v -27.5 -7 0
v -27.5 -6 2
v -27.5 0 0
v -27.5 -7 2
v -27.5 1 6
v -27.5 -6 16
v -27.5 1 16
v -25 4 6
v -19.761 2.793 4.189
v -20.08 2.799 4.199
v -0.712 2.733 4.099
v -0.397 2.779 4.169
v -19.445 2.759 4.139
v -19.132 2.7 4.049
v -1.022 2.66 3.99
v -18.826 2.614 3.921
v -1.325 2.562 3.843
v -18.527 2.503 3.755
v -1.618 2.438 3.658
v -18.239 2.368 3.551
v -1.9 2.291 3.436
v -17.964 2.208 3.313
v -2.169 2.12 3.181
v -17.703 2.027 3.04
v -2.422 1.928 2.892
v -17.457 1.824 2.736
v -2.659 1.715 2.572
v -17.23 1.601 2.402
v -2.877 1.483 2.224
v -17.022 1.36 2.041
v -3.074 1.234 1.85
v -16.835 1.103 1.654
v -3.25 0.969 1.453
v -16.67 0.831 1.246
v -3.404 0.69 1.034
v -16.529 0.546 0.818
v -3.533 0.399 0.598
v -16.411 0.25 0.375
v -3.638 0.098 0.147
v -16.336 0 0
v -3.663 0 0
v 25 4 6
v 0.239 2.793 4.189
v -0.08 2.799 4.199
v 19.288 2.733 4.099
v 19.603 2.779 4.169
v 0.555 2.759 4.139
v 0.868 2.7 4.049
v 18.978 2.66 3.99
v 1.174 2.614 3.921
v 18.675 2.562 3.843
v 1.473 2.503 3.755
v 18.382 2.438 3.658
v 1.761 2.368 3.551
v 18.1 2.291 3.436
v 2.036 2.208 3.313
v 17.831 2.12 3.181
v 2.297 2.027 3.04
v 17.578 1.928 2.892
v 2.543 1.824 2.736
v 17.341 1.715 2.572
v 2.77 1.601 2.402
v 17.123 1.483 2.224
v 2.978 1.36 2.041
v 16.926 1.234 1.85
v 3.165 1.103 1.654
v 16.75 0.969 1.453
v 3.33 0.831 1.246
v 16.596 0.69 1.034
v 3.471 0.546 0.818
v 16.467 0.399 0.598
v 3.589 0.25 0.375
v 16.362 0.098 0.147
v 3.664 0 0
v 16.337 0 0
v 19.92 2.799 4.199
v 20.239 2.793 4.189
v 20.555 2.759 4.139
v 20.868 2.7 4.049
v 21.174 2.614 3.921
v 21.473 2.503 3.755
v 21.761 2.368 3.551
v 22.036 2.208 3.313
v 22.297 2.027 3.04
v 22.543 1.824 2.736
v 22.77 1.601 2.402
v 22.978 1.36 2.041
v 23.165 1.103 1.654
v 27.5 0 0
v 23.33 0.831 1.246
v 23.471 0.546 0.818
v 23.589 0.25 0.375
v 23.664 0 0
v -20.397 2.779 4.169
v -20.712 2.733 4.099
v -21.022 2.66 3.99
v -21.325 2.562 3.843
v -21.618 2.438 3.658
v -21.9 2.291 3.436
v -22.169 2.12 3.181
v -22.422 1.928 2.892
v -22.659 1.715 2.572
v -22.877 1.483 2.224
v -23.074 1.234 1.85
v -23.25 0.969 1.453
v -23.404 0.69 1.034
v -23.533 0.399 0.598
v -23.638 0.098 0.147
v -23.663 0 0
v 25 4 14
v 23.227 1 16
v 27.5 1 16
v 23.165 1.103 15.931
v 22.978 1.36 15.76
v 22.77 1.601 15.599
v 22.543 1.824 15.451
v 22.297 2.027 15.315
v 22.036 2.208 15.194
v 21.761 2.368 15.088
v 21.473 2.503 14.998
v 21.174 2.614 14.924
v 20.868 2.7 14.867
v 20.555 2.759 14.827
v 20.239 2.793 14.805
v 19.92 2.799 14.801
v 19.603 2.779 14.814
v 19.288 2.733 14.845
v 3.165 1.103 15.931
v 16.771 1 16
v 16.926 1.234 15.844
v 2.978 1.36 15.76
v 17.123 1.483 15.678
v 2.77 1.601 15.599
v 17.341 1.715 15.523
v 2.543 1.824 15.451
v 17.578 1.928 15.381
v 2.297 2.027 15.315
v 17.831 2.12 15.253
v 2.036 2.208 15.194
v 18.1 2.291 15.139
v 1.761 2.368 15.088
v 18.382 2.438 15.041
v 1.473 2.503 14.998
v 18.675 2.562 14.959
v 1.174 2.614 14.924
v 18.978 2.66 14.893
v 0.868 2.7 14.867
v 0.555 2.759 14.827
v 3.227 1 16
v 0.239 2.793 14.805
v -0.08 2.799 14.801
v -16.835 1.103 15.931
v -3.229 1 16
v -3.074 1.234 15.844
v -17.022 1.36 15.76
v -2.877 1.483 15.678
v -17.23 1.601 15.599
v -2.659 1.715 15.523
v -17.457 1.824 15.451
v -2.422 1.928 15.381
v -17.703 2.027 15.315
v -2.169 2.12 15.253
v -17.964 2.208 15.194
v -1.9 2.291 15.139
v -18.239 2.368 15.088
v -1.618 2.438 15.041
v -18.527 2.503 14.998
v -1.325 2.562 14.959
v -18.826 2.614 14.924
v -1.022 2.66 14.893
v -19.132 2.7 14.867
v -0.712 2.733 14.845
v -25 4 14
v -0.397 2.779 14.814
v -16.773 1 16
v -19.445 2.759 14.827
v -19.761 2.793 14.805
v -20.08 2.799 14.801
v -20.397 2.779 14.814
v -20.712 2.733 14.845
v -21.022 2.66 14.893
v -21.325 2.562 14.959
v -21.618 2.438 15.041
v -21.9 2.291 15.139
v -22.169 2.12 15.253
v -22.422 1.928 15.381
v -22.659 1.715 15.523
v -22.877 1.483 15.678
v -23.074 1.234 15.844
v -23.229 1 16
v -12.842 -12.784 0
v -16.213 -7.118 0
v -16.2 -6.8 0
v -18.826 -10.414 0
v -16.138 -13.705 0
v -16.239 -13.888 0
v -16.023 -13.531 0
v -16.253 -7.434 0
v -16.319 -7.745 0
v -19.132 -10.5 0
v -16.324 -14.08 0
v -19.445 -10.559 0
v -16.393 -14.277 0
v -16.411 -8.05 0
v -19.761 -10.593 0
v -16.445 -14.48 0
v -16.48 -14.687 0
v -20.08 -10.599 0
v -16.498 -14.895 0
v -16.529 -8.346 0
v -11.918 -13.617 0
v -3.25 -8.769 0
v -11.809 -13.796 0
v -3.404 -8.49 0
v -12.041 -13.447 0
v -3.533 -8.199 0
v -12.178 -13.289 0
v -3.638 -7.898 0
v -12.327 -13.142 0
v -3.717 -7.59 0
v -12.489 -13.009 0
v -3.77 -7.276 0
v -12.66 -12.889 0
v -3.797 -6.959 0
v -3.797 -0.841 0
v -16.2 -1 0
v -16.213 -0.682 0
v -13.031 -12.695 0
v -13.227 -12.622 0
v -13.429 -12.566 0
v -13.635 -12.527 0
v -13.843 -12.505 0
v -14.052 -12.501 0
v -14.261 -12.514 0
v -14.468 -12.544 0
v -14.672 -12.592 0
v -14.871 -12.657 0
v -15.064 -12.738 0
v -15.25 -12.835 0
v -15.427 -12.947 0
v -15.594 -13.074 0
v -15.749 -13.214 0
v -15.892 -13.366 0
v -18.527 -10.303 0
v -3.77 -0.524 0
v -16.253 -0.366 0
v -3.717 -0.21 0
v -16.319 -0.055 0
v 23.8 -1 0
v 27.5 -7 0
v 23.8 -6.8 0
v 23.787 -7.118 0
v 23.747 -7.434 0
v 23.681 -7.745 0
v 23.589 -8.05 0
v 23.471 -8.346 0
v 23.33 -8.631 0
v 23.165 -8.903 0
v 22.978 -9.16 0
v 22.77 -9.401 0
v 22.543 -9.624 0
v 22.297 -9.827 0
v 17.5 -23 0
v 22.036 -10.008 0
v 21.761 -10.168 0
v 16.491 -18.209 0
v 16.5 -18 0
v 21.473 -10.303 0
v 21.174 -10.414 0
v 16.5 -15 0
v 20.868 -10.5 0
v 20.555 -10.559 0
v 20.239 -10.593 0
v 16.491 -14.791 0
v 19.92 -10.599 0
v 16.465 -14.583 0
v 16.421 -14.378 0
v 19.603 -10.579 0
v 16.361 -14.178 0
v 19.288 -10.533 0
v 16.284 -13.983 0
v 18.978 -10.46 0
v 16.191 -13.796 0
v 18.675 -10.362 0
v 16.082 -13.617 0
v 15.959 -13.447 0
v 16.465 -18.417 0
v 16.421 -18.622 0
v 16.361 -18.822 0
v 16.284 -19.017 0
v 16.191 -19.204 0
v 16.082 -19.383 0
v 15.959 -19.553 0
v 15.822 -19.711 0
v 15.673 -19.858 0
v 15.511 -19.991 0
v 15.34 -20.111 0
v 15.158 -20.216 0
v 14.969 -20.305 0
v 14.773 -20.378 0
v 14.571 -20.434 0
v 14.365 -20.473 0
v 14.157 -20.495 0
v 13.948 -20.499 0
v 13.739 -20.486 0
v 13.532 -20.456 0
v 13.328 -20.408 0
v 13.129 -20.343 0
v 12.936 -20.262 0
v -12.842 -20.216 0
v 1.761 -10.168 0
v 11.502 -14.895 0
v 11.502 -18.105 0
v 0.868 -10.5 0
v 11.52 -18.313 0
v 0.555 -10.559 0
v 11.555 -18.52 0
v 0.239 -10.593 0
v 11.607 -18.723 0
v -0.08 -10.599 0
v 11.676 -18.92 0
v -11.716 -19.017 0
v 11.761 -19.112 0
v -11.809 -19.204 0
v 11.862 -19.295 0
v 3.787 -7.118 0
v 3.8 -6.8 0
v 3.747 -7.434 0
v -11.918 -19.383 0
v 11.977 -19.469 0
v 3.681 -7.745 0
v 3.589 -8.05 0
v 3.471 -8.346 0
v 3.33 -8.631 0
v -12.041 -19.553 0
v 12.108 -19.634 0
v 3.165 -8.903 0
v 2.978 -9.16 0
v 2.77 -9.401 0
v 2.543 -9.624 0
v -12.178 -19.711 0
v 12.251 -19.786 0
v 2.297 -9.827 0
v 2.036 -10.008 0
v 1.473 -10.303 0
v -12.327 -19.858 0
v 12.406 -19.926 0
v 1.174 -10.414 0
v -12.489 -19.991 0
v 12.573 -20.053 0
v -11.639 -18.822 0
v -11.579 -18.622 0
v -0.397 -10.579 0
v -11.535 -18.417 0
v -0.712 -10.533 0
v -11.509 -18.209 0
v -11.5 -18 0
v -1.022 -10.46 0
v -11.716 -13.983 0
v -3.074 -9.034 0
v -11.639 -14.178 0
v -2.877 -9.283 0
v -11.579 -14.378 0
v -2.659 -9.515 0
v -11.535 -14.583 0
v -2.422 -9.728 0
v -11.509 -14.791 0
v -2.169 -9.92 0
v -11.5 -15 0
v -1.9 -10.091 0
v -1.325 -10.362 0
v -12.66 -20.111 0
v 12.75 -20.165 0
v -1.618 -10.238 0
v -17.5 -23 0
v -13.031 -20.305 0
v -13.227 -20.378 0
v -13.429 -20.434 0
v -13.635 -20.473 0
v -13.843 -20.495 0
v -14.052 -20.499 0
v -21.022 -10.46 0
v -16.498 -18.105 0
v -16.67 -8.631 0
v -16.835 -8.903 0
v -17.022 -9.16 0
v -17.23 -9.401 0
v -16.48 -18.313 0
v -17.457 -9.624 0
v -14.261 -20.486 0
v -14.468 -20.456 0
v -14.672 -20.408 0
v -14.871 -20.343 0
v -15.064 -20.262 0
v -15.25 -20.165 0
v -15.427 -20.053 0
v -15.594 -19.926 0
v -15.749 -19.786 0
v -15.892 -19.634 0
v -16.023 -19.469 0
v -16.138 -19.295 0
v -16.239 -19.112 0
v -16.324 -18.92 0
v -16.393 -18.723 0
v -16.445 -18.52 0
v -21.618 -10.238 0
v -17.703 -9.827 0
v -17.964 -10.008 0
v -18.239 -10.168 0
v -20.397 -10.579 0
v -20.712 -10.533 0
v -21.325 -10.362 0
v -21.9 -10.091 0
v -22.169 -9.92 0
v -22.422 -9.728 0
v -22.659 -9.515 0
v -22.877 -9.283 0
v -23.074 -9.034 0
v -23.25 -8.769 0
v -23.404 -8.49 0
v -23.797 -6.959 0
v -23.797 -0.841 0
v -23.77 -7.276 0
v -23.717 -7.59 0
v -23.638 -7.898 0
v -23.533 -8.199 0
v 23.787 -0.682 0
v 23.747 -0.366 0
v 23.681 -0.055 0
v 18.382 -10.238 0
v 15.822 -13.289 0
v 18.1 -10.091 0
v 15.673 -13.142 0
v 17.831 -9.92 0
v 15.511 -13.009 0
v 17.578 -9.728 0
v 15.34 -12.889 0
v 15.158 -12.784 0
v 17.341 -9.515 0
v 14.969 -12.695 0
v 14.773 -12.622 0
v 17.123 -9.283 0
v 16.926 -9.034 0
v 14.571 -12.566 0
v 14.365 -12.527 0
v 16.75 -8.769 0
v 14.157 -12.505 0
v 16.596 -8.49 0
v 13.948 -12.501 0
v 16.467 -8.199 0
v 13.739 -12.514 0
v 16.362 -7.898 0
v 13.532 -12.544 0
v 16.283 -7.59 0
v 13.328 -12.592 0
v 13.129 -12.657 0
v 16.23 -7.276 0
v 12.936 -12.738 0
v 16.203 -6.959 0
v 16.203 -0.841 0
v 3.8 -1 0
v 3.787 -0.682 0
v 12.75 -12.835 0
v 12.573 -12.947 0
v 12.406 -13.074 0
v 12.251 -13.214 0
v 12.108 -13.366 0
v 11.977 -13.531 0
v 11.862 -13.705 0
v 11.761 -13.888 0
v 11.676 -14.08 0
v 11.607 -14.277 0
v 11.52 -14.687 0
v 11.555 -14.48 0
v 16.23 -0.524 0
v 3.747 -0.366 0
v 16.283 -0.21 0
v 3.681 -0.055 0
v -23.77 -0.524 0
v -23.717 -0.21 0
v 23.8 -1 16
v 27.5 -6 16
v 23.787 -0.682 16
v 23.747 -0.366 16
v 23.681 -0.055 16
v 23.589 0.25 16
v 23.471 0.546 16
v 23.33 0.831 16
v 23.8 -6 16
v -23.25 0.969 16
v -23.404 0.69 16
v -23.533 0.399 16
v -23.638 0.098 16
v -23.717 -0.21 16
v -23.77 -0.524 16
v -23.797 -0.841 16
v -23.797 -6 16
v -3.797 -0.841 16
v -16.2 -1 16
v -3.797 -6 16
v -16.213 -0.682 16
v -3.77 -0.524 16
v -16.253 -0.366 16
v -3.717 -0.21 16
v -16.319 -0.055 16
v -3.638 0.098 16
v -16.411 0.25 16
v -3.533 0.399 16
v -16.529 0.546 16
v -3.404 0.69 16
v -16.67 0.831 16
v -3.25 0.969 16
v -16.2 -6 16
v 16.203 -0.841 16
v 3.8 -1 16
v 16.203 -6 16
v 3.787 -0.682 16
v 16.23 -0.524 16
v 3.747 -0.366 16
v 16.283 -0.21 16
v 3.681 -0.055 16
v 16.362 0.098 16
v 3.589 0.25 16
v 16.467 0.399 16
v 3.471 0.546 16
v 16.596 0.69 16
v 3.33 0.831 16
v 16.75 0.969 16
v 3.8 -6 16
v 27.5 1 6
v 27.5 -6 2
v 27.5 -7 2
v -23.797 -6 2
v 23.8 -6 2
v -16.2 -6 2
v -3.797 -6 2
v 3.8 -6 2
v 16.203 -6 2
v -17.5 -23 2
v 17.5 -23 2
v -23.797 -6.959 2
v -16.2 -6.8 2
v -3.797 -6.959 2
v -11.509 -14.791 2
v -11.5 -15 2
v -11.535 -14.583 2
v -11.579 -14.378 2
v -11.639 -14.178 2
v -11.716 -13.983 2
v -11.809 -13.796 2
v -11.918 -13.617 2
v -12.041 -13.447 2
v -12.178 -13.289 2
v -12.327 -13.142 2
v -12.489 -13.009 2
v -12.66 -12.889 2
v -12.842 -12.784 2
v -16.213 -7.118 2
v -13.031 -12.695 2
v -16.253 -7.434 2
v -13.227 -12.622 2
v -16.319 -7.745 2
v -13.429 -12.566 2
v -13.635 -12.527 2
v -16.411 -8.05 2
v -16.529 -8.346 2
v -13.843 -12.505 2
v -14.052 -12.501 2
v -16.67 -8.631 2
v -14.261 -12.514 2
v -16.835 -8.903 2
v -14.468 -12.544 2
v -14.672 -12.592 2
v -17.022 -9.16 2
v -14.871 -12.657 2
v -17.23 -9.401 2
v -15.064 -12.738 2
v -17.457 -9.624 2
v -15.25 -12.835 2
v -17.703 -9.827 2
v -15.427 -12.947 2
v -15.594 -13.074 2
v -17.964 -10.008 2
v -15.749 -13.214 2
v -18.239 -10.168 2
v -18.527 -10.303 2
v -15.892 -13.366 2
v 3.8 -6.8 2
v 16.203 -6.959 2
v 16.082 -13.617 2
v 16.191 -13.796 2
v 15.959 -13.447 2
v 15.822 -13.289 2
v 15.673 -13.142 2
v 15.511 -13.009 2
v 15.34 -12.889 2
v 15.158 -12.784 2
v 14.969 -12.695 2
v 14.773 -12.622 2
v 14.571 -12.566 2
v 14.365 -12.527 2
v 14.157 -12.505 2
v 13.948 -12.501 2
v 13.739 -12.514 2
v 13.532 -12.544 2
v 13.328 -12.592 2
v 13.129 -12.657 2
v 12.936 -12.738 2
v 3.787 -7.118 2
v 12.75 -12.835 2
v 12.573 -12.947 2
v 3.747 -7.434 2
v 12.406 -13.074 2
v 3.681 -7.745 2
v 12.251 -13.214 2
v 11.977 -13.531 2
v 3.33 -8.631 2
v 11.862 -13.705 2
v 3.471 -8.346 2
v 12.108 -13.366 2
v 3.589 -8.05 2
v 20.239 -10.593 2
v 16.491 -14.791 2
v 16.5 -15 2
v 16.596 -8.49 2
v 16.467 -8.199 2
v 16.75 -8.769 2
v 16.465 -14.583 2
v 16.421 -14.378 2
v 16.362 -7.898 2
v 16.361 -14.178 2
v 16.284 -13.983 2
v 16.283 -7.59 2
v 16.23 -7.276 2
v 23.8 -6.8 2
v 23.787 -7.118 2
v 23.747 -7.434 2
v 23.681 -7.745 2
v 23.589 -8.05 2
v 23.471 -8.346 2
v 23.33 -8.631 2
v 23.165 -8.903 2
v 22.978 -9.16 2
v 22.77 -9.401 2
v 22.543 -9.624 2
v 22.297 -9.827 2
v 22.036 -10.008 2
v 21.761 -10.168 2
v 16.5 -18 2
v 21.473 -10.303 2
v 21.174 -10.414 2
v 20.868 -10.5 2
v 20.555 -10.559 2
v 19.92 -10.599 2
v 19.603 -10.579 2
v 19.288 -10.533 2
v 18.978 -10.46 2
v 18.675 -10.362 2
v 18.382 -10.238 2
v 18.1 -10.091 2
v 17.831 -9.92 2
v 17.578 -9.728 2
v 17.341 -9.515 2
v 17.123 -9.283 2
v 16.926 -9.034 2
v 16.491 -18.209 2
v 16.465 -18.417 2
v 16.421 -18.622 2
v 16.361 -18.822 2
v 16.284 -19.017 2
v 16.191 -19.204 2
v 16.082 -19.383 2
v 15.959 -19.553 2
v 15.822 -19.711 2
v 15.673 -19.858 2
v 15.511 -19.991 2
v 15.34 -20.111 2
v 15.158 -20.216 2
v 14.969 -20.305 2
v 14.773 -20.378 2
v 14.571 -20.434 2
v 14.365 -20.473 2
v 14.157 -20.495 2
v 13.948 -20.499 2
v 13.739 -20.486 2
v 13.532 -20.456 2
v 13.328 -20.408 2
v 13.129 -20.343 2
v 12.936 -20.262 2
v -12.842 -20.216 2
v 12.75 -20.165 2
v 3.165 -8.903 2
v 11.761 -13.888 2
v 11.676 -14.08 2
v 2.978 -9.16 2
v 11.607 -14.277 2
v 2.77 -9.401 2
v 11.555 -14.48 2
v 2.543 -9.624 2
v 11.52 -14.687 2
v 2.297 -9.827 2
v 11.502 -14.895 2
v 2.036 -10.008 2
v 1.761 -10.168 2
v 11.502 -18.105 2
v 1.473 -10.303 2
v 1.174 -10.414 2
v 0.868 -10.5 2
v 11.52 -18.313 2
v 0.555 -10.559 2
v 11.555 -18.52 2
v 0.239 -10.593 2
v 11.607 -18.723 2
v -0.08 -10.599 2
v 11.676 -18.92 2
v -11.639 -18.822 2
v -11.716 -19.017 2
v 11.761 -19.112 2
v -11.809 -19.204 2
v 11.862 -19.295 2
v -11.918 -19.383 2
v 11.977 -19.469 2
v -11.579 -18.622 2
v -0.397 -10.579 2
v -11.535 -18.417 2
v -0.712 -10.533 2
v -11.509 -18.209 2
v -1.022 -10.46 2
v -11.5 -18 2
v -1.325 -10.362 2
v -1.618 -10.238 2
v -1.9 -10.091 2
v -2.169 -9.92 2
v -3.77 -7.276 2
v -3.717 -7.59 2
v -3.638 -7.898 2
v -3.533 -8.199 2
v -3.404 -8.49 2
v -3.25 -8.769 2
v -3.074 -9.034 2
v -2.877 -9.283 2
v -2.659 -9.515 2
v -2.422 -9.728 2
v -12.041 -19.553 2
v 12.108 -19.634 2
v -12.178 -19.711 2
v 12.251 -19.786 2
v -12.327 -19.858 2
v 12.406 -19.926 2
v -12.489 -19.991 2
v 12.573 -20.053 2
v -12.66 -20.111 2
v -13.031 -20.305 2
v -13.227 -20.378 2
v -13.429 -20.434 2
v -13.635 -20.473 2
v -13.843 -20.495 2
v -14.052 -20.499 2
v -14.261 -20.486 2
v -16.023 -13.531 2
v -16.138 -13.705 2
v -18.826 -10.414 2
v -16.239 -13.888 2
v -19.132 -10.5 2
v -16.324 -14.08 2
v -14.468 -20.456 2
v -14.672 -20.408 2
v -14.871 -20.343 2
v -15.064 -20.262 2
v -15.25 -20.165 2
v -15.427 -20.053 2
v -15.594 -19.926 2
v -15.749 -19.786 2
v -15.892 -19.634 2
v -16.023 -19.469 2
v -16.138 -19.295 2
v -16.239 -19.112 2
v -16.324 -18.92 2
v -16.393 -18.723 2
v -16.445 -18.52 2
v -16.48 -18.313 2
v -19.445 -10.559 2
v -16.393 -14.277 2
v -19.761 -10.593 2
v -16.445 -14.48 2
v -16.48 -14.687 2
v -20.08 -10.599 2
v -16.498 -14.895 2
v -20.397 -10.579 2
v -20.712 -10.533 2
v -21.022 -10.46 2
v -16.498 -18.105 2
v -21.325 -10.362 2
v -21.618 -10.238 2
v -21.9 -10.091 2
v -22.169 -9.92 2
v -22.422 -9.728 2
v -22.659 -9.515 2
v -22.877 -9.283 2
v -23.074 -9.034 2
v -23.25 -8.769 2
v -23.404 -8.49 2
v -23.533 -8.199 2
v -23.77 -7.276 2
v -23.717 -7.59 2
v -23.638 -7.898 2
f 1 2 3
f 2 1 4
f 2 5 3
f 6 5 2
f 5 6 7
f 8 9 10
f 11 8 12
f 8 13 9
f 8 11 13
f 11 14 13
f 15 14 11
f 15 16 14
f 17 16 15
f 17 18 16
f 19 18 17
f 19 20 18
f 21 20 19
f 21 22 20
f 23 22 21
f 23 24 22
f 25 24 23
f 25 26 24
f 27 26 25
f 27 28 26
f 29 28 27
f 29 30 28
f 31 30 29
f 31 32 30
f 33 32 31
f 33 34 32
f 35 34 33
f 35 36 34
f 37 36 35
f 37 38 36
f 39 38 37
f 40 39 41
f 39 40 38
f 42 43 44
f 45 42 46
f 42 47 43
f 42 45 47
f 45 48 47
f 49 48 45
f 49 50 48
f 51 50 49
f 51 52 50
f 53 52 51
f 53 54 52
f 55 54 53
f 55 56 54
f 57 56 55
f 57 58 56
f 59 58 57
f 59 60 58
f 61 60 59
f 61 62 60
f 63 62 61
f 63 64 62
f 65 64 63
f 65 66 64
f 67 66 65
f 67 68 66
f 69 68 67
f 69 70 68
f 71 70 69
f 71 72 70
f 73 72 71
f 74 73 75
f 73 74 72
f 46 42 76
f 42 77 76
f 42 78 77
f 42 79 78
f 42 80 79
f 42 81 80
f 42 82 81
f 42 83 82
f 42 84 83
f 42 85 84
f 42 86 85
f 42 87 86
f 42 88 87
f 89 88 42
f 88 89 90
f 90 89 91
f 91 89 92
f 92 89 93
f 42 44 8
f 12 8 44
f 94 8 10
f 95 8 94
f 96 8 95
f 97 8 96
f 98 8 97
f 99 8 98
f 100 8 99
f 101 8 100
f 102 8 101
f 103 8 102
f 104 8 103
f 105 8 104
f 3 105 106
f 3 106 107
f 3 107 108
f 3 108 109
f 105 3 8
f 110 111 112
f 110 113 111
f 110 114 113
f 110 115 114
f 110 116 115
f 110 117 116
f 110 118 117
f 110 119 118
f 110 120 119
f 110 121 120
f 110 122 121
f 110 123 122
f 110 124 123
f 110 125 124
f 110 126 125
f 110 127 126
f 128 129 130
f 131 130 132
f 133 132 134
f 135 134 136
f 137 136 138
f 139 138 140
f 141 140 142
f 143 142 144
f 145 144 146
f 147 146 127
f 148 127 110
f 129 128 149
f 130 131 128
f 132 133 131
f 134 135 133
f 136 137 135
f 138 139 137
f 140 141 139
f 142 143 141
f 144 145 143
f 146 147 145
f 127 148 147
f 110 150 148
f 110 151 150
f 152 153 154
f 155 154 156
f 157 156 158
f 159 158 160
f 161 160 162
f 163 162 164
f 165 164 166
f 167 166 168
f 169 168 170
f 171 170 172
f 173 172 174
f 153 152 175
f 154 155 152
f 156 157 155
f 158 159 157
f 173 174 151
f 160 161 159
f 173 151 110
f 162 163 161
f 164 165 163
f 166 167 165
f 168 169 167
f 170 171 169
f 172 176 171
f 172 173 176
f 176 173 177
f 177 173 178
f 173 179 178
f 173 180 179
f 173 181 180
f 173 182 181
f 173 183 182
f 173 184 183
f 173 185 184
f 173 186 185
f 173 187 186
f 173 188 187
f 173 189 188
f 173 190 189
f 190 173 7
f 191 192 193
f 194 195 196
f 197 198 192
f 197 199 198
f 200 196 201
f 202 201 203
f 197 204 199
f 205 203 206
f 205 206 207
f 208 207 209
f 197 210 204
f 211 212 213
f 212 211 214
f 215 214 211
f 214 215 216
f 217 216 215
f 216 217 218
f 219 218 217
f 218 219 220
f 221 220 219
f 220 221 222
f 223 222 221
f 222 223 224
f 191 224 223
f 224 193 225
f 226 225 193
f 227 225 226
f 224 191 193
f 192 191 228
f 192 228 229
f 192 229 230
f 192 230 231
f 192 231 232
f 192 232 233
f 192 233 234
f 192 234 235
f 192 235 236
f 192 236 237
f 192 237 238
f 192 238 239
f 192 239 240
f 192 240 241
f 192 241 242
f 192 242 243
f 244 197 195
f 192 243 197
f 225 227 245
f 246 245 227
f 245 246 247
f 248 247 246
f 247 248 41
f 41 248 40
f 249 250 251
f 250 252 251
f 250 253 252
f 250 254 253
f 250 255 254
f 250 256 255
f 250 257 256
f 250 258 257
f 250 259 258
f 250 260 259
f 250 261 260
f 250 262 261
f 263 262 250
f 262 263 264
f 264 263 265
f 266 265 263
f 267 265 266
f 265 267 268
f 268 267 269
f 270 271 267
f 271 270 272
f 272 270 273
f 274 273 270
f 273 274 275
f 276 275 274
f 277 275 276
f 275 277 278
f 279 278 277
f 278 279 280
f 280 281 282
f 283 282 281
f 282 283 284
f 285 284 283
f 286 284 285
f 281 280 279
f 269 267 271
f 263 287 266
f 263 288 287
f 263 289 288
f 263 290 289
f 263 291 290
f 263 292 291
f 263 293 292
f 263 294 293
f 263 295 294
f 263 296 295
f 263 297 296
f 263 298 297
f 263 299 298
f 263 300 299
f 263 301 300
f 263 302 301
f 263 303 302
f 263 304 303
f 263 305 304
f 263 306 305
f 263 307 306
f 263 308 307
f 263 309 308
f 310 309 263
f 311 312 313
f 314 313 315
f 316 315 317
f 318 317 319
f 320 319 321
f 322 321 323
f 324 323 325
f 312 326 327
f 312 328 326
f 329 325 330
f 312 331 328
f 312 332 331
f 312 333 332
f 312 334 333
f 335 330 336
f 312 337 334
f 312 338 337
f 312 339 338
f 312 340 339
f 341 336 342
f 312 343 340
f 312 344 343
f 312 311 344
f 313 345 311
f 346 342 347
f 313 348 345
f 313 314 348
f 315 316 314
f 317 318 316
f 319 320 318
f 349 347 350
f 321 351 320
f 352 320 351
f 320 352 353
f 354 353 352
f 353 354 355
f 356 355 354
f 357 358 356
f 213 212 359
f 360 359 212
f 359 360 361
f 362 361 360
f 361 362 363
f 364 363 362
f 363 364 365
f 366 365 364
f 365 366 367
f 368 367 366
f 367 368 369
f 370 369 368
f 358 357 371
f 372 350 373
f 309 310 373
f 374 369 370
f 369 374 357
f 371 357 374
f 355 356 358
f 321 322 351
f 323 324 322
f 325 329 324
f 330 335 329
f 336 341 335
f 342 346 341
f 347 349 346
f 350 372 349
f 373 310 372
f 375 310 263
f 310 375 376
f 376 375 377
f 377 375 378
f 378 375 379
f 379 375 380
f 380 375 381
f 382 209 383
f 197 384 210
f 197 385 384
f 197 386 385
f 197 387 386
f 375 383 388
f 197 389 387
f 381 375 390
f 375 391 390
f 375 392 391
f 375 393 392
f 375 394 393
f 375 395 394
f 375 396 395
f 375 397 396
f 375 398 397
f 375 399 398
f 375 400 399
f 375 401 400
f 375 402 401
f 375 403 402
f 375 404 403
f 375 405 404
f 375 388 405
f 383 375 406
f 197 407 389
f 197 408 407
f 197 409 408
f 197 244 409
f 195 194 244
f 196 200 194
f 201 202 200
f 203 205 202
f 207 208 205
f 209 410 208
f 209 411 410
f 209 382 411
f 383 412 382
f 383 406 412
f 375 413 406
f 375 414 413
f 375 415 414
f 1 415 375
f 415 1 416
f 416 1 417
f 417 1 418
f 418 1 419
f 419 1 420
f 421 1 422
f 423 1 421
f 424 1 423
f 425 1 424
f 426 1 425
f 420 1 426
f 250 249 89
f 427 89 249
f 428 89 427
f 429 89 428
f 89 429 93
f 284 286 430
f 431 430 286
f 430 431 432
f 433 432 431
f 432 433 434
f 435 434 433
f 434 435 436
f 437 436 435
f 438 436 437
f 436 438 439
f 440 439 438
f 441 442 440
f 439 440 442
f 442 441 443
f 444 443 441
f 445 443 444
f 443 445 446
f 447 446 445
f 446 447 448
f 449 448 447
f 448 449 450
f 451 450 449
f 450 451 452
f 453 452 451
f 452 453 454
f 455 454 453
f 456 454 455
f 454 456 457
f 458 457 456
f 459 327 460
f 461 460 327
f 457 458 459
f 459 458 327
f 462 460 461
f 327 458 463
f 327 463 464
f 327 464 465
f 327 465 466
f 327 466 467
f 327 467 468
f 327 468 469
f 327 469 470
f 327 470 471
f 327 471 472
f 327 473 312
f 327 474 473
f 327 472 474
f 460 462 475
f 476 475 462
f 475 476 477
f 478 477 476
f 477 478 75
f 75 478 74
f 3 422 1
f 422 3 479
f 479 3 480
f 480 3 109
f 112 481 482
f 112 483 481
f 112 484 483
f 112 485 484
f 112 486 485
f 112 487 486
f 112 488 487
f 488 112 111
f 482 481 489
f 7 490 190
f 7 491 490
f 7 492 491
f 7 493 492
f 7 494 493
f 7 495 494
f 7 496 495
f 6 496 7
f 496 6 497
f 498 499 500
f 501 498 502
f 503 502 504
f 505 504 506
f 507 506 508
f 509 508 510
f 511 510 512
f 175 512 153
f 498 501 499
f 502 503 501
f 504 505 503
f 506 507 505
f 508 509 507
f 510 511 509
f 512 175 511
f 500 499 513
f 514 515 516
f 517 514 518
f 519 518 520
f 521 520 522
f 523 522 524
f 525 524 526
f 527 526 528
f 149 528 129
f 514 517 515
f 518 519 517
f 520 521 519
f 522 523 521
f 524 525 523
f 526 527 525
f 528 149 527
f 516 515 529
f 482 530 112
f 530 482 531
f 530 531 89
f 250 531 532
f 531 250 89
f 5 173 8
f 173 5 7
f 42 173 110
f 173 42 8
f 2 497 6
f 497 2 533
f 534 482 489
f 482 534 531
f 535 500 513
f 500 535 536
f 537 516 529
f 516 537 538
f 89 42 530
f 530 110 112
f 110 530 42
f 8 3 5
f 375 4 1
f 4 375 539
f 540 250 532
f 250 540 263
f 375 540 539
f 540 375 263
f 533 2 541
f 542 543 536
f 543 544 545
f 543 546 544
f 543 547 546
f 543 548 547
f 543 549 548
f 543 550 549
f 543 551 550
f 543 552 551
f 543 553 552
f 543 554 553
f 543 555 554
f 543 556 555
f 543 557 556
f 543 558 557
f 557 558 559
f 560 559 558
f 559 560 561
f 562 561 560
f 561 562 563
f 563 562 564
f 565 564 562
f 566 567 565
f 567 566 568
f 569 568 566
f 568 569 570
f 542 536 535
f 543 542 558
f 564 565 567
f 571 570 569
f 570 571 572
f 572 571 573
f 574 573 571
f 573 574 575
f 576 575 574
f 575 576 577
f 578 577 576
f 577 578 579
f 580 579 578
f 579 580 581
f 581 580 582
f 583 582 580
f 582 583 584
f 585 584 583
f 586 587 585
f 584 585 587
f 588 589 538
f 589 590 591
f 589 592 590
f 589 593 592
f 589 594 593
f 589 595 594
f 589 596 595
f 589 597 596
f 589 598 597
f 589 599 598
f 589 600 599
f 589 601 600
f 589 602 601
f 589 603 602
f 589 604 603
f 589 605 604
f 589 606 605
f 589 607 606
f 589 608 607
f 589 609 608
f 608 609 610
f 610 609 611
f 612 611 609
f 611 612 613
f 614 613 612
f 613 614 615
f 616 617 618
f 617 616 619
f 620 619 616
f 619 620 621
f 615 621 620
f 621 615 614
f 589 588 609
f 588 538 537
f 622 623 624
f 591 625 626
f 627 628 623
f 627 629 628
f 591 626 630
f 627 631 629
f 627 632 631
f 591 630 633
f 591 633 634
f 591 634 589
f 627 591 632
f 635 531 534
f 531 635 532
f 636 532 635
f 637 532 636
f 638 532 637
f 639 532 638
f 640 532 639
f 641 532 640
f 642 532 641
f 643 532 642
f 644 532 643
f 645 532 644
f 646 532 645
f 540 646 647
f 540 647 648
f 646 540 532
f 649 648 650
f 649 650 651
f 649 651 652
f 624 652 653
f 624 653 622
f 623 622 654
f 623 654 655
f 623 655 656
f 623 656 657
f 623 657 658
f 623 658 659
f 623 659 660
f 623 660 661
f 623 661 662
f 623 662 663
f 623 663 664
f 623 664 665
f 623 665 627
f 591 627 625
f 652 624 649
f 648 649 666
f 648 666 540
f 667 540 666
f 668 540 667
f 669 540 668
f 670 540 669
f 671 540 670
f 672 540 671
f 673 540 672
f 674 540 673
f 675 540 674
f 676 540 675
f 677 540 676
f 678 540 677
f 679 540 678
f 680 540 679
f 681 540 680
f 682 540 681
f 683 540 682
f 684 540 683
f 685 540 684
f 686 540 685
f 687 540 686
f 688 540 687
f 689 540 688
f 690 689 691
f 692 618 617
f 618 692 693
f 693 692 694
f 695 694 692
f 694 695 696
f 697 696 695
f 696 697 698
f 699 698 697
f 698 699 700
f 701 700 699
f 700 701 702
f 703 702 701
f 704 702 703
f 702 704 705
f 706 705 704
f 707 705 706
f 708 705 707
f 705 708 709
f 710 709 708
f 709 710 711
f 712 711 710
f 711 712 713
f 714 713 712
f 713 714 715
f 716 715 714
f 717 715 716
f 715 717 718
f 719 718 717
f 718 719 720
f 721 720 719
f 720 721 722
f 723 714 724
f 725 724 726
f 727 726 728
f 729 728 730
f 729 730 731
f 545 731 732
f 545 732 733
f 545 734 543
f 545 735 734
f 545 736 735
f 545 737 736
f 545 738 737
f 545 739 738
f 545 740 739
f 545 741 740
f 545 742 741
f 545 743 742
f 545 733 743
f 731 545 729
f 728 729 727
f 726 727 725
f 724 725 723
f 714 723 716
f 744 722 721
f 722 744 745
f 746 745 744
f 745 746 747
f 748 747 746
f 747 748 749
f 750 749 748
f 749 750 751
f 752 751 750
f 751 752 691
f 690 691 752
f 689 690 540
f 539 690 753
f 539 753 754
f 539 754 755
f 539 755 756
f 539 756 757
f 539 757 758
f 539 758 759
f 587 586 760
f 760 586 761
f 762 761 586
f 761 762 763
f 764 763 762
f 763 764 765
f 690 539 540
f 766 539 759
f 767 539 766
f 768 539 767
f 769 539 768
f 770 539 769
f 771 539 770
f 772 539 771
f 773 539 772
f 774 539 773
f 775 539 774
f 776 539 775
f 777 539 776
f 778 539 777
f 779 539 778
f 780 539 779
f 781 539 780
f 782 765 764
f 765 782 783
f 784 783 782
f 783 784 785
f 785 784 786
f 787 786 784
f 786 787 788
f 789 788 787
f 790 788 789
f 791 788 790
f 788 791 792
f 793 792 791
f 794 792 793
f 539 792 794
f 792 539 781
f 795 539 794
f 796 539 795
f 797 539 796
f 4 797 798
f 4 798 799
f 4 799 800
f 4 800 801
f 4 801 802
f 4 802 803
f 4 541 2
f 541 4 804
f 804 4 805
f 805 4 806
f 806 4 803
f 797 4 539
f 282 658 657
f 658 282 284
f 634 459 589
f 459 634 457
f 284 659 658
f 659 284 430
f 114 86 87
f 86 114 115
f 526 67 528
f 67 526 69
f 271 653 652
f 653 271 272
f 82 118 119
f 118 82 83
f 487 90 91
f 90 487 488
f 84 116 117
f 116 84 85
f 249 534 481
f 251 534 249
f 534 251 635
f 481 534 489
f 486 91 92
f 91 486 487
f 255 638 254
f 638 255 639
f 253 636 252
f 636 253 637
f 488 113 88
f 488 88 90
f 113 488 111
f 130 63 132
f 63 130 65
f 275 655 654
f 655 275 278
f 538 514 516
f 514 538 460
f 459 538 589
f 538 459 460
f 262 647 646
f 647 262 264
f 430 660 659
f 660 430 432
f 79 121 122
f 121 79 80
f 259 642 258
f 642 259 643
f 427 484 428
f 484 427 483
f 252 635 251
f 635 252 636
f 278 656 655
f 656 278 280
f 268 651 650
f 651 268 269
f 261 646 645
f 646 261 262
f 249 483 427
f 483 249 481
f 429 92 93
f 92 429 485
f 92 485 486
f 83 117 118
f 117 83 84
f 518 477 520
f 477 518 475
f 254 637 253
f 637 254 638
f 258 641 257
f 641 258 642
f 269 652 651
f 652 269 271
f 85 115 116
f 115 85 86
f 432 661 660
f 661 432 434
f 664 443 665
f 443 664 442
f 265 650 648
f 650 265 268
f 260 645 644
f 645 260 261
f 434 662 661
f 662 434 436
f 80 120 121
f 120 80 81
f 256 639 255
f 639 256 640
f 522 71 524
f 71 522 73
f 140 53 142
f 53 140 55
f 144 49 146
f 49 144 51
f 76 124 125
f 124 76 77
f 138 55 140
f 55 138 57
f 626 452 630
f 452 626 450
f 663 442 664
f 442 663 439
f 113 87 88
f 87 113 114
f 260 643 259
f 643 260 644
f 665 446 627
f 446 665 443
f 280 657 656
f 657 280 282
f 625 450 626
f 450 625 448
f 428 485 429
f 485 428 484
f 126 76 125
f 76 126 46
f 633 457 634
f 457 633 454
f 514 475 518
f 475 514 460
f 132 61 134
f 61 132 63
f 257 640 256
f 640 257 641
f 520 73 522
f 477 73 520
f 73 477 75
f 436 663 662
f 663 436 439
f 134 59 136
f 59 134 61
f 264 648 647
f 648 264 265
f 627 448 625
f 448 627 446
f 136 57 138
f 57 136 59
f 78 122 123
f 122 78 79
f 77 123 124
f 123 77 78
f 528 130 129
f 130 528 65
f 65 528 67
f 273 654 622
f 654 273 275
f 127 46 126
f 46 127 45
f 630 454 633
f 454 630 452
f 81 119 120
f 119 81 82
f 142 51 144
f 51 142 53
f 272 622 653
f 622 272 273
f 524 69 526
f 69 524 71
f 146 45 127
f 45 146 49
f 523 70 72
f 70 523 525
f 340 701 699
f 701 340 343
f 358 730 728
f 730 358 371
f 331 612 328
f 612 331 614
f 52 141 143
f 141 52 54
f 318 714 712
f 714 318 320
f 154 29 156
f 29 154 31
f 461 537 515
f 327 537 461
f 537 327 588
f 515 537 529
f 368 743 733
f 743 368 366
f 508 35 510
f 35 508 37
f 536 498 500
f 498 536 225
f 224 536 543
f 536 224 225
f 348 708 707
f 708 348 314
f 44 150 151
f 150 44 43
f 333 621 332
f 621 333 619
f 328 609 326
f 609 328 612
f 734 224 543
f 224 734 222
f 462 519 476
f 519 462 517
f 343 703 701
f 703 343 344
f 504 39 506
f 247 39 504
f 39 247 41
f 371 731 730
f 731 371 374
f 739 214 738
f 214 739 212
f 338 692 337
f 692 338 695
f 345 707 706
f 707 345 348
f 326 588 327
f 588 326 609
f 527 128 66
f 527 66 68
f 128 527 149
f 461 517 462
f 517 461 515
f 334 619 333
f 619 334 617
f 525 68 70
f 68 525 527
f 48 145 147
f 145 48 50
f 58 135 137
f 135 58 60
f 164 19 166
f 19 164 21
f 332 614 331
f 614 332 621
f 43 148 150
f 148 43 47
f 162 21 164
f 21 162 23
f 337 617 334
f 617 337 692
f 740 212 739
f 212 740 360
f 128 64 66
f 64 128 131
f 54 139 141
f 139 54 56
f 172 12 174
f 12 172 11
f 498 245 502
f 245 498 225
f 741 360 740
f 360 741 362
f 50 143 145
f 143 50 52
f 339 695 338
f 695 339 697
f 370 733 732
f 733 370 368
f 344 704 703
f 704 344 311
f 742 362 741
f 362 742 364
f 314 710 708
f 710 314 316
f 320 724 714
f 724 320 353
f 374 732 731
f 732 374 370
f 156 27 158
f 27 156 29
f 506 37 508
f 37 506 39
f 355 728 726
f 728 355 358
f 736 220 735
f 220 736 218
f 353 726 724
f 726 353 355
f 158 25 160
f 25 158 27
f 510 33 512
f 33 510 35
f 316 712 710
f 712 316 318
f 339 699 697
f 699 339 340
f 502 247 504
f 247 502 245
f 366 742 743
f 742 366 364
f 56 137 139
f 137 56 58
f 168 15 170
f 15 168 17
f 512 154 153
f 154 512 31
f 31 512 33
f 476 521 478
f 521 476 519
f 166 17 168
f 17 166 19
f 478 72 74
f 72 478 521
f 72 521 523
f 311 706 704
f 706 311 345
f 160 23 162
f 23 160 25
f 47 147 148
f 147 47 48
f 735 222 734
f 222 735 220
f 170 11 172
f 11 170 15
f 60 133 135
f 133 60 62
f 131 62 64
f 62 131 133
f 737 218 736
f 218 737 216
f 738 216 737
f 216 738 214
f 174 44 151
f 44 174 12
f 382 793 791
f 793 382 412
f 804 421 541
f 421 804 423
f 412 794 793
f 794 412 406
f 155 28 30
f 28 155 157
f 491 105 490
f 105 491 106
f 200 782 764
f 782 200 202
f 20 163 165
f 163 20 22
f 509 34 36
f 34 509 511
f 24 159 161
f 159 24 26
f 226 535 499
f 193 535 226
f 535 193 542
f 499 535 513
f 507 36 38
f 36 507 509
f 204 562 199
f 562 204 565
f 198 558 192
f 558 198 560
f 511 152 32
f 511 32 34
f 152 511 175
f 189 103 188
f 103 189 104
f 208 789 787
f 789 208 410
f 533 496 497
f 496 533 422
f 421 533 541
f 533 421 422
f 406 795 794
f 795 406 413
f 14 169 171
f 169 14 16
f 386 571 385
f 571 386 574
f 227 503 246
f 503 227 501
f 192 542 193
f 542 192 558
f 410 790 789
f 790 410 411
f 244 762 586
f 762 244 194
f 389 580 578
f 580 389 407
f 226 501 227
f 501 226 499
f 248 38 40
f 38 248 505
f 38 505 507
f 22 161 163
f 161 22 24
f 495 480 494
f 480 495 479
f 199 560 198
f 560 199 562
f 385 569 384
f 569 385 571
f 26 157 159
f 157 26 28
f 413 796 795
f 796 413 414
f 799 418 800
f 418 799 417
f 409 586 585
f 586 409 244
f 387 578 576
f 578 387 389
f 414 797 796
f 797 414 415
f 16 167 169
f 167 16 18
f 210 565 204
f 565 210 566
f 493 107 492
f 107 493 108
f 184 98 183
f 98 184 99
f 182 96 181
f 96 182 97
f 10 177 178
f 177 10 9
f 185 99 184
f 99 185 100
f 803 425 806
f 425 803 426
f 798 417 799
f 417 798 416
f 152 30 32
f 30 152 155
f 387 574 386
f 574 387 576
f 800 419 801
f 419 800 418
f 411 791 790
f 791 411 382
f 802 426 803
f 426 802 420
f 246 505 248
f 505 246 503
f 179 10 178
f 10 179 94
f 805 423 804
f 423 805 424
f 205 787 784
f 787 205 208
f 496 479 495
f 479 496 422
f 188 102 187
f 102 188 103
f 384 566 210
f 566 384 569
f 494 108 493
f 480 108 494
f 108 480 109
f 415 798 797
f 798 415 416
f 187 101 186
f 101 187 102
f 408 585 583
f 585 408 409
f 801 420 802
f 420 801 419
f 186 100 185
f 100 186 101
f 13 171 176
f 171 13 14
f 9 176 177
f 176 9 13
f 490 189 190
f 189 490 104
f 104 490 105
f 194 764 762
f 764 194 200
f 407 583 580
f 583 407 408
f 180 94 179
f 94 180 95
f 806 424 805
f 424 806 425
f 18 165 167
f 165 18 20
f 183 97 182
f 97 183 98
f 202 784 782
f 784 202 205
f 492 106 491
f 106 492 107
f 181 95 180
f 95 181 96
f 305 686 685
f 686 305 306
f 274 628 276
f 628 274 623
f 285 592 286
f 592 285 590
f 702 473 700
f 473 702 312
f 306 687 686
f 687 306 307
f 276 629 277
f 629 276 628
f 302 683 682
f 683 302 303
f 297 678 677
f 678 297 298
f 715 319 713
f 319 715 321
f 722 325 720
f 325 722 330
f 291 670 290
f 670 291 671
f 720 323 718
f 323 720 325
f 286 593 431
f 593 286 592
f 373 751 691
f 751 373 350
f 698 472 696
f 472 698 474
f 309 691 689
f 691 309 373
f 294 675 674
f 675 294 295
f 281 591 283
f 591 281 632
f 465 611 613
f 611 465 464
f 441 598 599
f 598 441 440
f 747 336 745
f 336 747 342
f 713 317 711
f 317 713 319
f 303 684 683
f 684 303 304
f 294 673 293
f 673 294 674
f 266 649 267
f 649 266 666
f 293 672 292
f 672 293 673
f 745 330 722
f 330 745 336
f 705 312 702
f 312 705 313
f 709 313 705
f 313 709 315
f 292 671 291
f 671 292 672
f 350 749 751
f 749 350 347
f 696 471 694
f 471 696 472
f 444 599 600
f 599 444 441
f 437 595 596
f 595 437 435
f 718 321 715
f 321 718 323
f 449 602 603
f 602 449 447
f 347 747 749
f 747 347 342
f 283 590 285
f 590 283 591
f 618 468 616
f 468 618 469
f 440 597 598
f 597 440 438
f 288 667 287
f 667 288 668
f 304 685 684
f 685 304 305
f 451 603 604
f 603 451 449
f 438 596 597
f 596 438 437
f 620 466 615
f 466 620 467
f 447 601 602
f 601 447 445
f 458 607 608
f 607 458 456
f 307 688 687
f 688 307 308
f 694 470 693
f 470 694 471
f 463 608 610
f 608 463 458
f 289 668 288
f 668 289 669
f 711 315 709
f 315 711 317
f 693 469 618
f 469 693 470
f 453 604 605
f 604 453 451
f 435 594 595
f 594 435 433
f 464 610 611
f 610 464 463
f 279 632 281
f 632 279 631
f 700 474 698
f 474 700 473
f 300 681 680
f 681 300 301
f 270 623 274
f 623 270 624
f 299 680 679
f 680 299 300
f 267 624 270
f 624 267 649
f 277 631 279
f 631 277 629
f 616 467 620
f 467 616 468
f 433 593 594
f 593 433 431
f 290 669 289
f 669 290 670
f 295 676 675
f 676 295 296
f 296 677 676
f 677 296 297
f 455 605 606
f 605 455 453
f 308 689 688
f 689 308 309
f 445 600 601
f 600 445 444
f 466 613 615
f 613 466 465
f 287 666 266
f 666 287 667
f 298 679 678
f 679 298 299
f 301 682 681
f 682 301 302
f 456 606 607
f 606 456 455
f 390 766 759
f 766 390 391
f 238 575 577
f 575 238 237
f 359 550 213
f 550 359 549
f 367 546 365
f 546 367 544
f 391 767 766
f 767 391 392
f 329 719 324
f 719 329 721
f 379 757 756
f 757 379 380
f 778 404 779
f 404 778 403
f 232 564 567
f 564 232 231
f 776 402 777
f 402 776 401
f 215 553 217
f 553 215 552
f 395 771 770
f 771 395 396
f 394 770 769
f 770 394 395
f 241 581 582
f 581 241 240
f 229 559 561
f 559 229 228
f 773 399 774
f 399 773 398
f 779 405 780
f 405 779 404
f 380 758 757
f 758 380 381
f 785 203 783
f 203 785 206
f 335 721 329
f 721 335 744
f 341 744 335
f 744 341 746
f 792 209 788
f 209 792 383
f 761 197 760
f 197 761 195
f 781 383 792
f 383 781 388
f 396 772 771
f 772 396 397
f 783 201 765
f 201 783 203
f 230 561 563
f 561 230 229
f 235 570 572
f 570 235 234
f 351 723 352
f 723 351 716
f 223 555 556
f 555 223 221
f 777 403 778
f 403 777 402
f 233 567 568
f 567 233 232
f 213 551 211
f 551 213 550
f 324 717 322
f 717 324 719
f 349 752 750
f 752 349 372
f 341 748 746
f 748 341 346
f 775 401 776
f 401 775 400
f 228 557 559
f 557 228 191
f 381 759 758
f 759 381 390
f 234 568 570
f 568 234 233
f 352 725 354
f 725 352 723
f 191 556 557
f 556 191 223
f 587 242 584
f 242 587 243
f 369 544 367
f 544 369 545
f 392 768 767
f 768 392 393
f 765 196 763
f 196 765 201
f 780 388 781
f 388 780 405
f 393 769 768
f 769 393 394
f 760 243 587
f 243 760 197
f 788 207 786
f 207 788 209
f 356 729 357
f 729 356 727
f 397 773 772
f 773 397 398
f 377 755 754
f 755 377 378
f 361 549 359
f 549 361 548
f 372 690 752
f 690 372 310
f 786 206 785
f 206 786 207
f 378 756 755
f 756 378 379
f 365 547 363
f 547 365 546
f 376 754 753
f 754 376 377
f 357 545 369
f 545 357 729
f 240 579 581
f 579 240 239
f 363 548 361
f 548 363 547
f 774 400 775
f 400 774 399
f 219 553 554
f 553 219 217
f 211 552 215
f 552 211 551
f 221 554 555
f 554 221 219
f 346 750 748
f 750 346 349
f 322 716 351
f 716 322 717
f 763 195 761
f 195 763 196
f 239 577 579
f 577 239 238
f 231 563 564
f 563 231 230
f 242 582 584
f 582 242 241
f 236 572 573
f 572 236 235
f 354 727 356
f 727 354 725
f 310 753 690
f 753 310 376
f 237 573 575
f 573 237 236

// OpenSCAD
$fn = 75;

module cutout(){
	hull(){
		r = 3.8;
		translate([0,-5.8,0])
			cylinder(50,r=r);
		cylinder(50,r=r);
		}
	}
	
	
difference(){
	union(){
		
		hull(){
			translate([0,-2.5,11])
				cube([55,7,10], center=true);
			translate([0,0,10])
				cube([50,8,8], center=true);
			translate([0,-3,1])
				cube([55,6,2], center=true);
			}
		translate([0,-3,5])
			cube([55,6,10], center=true);
		hull(){
			translate([0,-4,1])
				cube([55,6,2], center=true);
			translate([0,-13,1])
				cube([35,20,2], center=true);
			}
			
		}
	union(){
	
		translate([14,-15,-5])
		hull(){
			translate([0,-3,0])
				cylinder(10, r=2.5);
			cylinder(10, r=2.5);
			}
			
		translate([-14,-15,-5])
		hull(){
			translate([0,-3,0])
				cylinder(10, r=2.5);
			cylinder(10, r=2.5);
			}
	
		translate([0,-1,-5])
		union(){
			translate([20,0,0])
				cutout();
			translate([0,0,0])
				cutout();
			translate([-20,0,0])
				cutout();
			}
		
		
		}
	}
	
	
	
